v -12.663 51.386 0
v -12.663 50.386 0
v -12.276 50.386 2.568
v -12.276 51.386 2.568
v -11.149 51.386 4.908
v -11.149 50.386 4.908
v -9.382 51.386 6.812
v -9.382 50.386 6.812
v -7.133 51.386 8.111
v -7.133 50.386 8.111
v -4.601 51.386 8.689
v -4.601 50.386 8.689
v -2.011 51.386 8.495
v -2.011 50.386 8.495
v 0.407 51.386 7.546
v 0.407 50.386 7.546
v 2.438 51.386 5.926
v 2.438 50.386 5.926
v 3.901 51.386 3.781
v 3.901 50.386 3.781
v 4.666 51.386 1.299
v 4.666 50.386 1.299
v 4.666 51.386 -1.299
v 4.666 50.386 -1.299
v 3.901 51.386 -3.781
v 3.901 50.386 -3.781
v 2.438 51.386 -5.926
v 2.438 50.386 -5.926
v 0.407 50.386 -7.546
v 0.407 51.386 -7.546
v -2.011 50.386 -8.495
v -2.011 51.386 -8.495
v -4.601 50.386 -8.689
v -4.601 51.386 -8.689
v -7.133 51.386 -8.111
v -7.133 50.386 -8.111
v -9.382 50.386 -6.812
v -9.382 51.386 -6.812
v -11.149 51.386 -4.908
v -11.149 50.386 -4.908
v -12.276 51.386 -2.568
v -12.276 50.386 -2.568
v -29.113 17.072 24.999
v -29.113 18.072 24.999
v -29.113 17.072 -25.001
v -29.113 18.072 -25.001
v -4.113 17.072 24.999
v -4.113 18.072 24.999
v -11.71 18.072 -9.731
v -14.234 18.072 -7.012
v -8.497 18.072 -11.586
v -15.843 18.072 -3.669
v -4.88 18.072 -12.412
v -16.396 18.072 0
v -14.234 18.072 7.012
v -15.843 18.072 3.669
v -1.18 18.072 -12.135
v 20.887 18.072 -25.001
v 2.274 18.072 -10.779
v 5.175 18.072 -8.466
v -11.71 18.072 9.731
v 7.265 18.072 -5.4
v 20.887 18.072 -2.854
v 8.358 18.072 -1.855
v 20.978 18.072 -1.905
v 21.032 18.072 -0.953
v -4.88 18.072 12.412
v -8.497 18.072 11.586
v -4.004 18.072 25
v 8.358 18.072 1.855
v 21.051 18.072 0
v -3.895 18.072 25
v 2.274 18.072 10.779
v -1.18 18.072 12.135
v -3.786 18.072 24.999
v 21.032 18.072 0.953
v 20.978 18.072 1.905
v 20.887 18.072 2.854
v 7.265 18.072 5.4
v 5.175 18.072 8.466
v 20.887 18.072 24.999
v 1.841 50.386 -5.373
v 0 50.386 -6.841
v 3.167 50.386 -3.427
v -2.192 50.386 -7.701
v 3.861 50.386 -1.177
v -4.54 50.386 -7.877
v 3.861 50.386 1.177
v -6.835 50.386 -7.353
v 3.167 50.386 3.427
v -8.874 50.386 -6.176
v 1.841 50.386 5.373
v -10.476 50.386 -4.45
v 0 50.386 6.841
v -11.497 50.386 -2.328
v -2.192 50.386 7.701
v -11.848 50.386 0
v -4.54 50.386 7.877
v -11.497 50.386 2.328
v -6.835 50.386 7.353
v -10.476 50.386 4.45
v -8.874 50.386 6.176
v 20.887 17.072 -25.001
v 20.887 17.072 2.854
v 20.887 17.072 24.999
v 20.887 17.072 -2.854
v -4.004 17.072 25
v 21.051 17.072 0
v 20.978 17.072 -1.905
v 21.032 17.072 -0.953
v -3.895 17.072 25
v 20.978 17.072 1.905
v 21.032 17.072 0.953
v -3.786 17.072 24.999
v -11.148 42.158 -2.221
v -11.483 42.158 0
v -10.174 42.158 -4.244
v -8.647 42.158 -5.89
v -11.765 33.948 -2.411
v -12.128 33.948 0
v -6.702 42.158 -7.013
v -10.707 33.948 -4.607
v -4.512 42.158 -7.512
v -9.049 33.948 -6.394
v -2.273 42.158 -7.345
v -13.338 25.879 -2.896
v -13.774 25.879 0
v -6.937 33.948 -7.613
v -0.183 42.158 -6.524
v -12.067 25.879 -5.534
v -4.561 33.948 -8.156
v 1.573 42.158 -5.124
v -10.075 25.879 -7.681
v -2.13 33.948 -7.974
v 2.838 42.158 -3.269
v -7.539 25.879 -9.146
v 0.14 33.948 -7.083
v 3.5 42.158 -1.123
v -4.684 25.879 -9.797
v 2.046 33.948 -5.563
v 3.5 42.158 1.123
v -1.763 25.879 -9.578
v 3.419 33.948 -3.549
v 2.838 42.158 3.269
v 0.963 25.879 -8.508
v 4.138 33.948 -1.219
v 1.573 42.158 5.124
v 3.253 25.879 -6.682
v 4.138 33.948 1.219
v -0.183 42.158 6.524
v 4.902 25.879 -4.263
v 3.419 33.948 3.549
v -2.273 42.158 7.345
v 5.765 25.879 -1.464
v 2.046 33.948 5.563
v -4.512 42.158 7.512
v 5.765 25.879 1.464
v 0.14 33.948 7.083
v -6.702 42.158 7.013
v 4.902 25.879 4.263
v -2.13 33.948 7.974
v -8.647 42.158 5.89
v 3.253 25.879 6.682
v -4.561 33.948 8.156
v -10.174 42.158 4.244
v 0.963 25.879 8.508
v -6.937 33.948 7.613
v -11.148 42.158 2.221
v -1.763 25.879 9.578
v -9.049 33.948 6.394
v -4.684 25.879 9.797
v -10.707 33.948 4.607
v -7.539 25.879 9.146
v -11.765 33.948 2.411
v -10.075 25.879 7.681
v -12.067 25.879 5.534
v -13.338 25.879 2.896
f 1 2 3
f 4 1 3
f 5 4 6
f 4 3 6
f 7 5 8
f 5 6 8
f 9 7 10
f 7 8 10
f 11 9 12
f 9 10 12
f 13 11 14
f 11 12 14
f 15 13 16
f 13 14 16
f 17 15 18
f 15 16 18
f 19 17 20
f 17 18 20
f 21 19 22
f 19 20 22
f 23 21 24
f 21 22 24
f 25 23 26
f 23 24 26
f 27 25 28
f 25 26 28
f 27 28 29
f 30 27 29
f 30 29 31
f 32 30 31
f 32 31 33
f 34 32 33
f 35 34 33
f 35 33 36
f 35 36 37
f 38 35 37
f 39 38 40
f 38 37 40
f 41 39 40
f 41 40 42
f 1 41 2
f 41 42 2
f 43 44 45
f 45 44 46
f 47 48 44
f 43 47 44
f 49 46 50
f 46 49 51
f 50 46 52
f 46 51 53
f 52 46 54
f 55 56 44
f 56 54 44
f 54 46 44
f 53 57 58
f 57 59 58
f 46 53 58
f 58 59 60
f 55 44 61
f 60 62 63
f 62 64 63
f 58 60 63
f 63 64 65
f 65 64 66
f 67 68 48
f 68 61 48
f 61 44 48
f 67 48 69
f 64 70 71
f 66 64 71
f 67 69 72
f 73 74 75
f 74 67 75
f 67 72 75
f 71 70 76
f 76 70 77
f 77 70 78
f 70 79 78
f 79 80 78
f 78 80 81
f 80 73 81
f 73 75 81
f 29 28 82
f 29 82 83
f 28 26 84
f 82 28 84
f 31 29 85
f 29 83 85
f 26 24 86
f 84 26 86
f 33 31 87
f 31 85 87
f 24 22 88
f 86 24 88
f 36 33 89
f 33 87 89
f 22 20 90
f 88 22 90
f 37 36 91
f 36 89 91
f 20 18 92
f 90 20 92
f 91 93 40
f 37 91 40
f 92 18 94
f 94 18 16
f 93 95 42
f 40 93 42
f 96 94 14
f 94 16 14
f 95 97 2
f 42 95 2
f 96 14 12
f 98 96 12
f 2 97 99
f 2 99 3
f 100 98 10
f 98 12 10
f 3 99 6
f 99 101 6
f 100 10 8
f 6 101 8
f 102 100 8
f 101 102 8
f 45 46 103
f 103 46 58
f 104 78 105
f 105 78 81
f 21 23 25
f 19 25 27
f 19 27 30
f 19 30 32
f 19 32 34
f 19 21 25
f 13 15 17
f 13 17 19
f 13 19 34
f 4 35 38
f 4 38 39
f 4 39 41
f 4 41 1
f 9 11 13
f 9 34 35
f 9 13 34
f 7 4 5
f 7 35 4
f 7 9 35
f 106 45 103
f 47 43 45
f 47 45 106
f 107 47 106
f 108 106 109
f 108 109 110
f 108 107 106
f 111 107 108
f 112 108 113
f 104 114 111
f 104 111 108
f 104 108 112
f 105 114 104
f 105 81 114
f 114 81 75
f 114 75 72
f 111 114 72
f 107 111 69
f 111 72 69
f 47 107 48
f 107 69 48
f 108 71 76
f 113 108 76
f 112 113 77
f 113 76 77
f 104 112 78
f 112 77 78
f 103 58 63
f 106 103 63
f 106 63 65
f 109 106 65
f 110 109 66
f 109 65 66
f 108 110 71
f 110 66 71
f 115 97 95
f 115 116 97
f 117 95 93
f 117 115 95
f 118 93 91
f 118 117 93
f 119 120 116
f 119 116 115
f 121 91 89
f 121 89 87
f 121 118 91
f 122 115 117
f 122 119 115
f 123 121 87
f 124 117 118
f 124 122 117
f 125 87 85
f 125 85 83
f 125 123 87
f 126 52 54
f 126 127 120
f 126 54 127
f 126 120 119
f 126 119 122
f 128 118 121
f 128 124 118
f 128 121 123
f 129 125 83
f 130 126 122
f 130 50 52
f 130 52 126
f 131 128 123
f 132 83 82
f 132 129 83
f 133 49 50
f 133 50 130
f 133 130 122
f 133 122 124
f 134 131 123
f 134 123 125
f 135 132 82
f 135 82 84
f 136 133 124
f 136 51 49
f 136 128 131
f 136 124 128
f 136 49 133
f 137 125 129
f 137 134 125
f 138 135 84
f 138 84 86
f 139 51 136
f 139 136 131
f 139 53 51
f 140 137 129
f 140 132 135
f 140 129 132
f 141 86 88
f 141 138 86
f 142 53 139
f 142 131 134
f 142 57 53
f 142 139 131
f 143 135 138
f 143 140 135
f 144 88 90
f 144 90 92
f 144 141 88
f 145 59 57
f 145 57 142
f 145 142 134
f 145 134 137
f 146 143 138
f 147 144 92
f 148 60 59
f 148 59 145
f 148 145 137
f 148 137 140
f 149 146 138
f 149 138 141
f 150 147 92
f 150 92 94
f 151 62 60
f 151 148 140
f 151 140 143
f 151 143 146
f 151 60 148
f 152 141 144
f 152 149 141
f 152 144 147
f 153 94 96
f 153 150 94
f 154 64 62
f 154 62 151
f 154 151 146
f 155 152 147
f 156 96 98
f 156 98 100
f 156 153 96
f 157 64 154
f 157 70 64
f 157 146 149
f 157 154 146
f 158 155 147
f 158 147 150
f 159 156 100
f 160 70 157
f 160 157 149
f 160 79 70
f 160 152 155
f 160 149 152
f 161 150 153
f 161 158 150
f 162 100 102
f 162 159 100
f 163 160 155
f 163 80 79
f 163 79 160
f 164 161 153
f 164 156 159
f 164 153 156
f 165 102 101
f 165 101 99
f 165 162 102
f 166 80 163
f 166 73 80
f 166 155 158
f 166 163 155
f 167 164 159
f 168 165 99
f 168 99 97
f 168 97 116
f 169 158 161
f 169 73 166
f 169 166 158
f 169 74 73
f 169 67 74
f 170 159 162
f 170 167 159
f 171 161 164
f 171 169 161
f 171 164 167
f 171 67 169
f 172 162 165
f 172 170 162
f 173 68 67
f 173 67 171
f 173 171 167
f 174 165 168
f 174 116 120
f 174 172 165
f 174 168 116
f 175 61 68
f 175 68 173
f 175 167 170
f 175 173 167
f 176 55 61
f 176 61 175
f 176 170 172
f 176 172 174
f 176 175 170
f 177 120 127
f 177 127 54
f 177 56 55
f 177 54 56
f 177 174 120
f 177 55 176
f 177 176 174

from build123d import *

# Parameters (mm, degrees)
F3_DEPTH = 1
F4_R     = 8.7131724749
F5_DEPTH = 1


with BuildPart() as f1:
    # F0 (on Top) → F1 (revolve)
    with BuildSketch(Plane.XY):
        with BuildLine():
            Line((-3.9494680241, 50.3856427968), (-11.8484050035, 50.3856427968))
            ThreePointArc((-11.8484050035, 50.3856427968), (-12.128128908, 33.9480583368), (-16.3962785155, 18.0718079209))
            Line((-16.3962785155, 18.0718079209), (-3.9494680241, 18.0718079209))
            Line((-3.9494680241, 18.0718079209), (-3.9494680241, 50.3856427968))
        make_face()
    revolve(axis=Axis((-3.9494680241, 34.2287253588, 0), (0, -1, 0)))

    # F2 (on face) → F3 (join)
    with BuildSketch(Plane.XZ.offset(-18.0718079209)):
        with BuildLine():
            ThreePointArc((20.8871186327, -2.8537629964), (21.0096452056, -1.4292189441), (21.0505319759, 0))
            ThreePointArc((21.0505319759, 0), (21.0096452056, 1.4292189441), (20.8871186327, 2.8537629964))
            Line((20.8871186327, 2.8537629964), (20.8871186327, -0.0005340841))
            Line((20.8871186327, -0.0005340841), (20.8871186327, -2.8537629964))
        make_face()
        with BuildLine():
            Line((20.8871186327, -0.0005340841), (20.8871186327, 2.8537629964))
            ThreePointArc((20.8871186327, 2.8537629964), (12.7495750458, 18.6048907696), (-3.7860546809, 24.9994659159))
            Line((-3.7860546809, 24.9994659159), (-4.1128813673, 24.9994659159))
            Line((-4.1128813673, 24.9994659159), (-4.1128813673, -0.0005340841))
            Line((-4.1128813673, -0.0005340841), (20.8871186327, -0.0005340841))
        make_face()
        with BuildLine():
            ThreePointArc((-3.7860546809, 24.9994659159), (12.7495750458, 18.6048907696), (20.8871186327, 2.8537629964))
            Line((20.8871186327, 2.8537629964), (20.8871186327, 24.9994659159))
            Line((20.8871186327, 24.9994659159), (-3.7860546809, 24.9994659159))
        make_face()
        with BuildLine():
            Line((20.8871186327, -25.0005340841), (20.8871186327, -2.8537629964))
            ThreePointArc((20.8871186327, -2.8537629964), (-5.3784203627, -24.9591284947), (-28.9494680184, -0.0005340841))
            Line((-28.9494680184, -0.0005340841), (-29.1128813673, -0.0005340841))
            Line((-29.1128813673, -0.0005340841), (-29.1128813673, -25.0005340841))
            Line((-29.1128813673, -25.0005340841), (20.8871186327, -25.0005340841))
        make_face()
        with BuildLine():
            ThreePointArc((-28.9494680184, -0.0005340841), (-5.3784203627, -24.9591284947), (20.8871186327, -2.8537629964))
            Line((20.8871186327, -2.8537629964), (20.8871186327, -0.0005340841))
            Line((20.8871186327, -0.0005340841), (-4.1128813673, -0.0005340841))
            Line((-4.1128813673, -0.0005340841), (-28.9494680184, -0.0005340841))
        make_face()
        with BuildLine():
            Line((-4.1128813673, 24.9994659159), (-3.7860546809, 24.9994659159))
            ThreePointArc((-3.7860546809, 24.9994659159), (-3.9494680241, 25), (-4.1128813673, 24.9994659159))
        make_face()
        with BuildLine():
            Line((-29.1128813673, -0.0005340841), (-28.9494680184, -0.0005340841))
            ThreePointArc((-28.9494680184, -0.0005340841), (-21.6850069981, 17.6196100213), (-4.1128813673, 24.9994659159))
            Line((-4.1128813673, 24.9994659159), (-29.1128813673, 24.9994659159))
            Line((-29.1128813673, 24.9994659159), (-29.1128813673, -0.0005340841))
        make_face()
        with BuildLine():
            ThreePointArc((-4.1128813673, 24.9994659159), (-21.6850069981, 17.6196100213), (-28.9494680184, -0.0005340841))
            Line((-28.9494680184, -0.0005340841), (-4.1128813673, -0.0005340841))
            Line((-4.1128813673, -0.0005340841), (-4.1128813673, 24.9994659159))
        make_face()
    extrude(amount=F3_DEPTH)

    # F4 (on face) → F5 (join)
    with BuildSketch(Plane(origin=(0, 50.3856427968, 0), x_dir=(-1, 0, 0), z_dir=(0, 1, 0))):
        with Locations((3.9494680241, 0)):
            Circle(F4_R)
    extrude(amount=F5_DEPTH)


solid = f1.part
